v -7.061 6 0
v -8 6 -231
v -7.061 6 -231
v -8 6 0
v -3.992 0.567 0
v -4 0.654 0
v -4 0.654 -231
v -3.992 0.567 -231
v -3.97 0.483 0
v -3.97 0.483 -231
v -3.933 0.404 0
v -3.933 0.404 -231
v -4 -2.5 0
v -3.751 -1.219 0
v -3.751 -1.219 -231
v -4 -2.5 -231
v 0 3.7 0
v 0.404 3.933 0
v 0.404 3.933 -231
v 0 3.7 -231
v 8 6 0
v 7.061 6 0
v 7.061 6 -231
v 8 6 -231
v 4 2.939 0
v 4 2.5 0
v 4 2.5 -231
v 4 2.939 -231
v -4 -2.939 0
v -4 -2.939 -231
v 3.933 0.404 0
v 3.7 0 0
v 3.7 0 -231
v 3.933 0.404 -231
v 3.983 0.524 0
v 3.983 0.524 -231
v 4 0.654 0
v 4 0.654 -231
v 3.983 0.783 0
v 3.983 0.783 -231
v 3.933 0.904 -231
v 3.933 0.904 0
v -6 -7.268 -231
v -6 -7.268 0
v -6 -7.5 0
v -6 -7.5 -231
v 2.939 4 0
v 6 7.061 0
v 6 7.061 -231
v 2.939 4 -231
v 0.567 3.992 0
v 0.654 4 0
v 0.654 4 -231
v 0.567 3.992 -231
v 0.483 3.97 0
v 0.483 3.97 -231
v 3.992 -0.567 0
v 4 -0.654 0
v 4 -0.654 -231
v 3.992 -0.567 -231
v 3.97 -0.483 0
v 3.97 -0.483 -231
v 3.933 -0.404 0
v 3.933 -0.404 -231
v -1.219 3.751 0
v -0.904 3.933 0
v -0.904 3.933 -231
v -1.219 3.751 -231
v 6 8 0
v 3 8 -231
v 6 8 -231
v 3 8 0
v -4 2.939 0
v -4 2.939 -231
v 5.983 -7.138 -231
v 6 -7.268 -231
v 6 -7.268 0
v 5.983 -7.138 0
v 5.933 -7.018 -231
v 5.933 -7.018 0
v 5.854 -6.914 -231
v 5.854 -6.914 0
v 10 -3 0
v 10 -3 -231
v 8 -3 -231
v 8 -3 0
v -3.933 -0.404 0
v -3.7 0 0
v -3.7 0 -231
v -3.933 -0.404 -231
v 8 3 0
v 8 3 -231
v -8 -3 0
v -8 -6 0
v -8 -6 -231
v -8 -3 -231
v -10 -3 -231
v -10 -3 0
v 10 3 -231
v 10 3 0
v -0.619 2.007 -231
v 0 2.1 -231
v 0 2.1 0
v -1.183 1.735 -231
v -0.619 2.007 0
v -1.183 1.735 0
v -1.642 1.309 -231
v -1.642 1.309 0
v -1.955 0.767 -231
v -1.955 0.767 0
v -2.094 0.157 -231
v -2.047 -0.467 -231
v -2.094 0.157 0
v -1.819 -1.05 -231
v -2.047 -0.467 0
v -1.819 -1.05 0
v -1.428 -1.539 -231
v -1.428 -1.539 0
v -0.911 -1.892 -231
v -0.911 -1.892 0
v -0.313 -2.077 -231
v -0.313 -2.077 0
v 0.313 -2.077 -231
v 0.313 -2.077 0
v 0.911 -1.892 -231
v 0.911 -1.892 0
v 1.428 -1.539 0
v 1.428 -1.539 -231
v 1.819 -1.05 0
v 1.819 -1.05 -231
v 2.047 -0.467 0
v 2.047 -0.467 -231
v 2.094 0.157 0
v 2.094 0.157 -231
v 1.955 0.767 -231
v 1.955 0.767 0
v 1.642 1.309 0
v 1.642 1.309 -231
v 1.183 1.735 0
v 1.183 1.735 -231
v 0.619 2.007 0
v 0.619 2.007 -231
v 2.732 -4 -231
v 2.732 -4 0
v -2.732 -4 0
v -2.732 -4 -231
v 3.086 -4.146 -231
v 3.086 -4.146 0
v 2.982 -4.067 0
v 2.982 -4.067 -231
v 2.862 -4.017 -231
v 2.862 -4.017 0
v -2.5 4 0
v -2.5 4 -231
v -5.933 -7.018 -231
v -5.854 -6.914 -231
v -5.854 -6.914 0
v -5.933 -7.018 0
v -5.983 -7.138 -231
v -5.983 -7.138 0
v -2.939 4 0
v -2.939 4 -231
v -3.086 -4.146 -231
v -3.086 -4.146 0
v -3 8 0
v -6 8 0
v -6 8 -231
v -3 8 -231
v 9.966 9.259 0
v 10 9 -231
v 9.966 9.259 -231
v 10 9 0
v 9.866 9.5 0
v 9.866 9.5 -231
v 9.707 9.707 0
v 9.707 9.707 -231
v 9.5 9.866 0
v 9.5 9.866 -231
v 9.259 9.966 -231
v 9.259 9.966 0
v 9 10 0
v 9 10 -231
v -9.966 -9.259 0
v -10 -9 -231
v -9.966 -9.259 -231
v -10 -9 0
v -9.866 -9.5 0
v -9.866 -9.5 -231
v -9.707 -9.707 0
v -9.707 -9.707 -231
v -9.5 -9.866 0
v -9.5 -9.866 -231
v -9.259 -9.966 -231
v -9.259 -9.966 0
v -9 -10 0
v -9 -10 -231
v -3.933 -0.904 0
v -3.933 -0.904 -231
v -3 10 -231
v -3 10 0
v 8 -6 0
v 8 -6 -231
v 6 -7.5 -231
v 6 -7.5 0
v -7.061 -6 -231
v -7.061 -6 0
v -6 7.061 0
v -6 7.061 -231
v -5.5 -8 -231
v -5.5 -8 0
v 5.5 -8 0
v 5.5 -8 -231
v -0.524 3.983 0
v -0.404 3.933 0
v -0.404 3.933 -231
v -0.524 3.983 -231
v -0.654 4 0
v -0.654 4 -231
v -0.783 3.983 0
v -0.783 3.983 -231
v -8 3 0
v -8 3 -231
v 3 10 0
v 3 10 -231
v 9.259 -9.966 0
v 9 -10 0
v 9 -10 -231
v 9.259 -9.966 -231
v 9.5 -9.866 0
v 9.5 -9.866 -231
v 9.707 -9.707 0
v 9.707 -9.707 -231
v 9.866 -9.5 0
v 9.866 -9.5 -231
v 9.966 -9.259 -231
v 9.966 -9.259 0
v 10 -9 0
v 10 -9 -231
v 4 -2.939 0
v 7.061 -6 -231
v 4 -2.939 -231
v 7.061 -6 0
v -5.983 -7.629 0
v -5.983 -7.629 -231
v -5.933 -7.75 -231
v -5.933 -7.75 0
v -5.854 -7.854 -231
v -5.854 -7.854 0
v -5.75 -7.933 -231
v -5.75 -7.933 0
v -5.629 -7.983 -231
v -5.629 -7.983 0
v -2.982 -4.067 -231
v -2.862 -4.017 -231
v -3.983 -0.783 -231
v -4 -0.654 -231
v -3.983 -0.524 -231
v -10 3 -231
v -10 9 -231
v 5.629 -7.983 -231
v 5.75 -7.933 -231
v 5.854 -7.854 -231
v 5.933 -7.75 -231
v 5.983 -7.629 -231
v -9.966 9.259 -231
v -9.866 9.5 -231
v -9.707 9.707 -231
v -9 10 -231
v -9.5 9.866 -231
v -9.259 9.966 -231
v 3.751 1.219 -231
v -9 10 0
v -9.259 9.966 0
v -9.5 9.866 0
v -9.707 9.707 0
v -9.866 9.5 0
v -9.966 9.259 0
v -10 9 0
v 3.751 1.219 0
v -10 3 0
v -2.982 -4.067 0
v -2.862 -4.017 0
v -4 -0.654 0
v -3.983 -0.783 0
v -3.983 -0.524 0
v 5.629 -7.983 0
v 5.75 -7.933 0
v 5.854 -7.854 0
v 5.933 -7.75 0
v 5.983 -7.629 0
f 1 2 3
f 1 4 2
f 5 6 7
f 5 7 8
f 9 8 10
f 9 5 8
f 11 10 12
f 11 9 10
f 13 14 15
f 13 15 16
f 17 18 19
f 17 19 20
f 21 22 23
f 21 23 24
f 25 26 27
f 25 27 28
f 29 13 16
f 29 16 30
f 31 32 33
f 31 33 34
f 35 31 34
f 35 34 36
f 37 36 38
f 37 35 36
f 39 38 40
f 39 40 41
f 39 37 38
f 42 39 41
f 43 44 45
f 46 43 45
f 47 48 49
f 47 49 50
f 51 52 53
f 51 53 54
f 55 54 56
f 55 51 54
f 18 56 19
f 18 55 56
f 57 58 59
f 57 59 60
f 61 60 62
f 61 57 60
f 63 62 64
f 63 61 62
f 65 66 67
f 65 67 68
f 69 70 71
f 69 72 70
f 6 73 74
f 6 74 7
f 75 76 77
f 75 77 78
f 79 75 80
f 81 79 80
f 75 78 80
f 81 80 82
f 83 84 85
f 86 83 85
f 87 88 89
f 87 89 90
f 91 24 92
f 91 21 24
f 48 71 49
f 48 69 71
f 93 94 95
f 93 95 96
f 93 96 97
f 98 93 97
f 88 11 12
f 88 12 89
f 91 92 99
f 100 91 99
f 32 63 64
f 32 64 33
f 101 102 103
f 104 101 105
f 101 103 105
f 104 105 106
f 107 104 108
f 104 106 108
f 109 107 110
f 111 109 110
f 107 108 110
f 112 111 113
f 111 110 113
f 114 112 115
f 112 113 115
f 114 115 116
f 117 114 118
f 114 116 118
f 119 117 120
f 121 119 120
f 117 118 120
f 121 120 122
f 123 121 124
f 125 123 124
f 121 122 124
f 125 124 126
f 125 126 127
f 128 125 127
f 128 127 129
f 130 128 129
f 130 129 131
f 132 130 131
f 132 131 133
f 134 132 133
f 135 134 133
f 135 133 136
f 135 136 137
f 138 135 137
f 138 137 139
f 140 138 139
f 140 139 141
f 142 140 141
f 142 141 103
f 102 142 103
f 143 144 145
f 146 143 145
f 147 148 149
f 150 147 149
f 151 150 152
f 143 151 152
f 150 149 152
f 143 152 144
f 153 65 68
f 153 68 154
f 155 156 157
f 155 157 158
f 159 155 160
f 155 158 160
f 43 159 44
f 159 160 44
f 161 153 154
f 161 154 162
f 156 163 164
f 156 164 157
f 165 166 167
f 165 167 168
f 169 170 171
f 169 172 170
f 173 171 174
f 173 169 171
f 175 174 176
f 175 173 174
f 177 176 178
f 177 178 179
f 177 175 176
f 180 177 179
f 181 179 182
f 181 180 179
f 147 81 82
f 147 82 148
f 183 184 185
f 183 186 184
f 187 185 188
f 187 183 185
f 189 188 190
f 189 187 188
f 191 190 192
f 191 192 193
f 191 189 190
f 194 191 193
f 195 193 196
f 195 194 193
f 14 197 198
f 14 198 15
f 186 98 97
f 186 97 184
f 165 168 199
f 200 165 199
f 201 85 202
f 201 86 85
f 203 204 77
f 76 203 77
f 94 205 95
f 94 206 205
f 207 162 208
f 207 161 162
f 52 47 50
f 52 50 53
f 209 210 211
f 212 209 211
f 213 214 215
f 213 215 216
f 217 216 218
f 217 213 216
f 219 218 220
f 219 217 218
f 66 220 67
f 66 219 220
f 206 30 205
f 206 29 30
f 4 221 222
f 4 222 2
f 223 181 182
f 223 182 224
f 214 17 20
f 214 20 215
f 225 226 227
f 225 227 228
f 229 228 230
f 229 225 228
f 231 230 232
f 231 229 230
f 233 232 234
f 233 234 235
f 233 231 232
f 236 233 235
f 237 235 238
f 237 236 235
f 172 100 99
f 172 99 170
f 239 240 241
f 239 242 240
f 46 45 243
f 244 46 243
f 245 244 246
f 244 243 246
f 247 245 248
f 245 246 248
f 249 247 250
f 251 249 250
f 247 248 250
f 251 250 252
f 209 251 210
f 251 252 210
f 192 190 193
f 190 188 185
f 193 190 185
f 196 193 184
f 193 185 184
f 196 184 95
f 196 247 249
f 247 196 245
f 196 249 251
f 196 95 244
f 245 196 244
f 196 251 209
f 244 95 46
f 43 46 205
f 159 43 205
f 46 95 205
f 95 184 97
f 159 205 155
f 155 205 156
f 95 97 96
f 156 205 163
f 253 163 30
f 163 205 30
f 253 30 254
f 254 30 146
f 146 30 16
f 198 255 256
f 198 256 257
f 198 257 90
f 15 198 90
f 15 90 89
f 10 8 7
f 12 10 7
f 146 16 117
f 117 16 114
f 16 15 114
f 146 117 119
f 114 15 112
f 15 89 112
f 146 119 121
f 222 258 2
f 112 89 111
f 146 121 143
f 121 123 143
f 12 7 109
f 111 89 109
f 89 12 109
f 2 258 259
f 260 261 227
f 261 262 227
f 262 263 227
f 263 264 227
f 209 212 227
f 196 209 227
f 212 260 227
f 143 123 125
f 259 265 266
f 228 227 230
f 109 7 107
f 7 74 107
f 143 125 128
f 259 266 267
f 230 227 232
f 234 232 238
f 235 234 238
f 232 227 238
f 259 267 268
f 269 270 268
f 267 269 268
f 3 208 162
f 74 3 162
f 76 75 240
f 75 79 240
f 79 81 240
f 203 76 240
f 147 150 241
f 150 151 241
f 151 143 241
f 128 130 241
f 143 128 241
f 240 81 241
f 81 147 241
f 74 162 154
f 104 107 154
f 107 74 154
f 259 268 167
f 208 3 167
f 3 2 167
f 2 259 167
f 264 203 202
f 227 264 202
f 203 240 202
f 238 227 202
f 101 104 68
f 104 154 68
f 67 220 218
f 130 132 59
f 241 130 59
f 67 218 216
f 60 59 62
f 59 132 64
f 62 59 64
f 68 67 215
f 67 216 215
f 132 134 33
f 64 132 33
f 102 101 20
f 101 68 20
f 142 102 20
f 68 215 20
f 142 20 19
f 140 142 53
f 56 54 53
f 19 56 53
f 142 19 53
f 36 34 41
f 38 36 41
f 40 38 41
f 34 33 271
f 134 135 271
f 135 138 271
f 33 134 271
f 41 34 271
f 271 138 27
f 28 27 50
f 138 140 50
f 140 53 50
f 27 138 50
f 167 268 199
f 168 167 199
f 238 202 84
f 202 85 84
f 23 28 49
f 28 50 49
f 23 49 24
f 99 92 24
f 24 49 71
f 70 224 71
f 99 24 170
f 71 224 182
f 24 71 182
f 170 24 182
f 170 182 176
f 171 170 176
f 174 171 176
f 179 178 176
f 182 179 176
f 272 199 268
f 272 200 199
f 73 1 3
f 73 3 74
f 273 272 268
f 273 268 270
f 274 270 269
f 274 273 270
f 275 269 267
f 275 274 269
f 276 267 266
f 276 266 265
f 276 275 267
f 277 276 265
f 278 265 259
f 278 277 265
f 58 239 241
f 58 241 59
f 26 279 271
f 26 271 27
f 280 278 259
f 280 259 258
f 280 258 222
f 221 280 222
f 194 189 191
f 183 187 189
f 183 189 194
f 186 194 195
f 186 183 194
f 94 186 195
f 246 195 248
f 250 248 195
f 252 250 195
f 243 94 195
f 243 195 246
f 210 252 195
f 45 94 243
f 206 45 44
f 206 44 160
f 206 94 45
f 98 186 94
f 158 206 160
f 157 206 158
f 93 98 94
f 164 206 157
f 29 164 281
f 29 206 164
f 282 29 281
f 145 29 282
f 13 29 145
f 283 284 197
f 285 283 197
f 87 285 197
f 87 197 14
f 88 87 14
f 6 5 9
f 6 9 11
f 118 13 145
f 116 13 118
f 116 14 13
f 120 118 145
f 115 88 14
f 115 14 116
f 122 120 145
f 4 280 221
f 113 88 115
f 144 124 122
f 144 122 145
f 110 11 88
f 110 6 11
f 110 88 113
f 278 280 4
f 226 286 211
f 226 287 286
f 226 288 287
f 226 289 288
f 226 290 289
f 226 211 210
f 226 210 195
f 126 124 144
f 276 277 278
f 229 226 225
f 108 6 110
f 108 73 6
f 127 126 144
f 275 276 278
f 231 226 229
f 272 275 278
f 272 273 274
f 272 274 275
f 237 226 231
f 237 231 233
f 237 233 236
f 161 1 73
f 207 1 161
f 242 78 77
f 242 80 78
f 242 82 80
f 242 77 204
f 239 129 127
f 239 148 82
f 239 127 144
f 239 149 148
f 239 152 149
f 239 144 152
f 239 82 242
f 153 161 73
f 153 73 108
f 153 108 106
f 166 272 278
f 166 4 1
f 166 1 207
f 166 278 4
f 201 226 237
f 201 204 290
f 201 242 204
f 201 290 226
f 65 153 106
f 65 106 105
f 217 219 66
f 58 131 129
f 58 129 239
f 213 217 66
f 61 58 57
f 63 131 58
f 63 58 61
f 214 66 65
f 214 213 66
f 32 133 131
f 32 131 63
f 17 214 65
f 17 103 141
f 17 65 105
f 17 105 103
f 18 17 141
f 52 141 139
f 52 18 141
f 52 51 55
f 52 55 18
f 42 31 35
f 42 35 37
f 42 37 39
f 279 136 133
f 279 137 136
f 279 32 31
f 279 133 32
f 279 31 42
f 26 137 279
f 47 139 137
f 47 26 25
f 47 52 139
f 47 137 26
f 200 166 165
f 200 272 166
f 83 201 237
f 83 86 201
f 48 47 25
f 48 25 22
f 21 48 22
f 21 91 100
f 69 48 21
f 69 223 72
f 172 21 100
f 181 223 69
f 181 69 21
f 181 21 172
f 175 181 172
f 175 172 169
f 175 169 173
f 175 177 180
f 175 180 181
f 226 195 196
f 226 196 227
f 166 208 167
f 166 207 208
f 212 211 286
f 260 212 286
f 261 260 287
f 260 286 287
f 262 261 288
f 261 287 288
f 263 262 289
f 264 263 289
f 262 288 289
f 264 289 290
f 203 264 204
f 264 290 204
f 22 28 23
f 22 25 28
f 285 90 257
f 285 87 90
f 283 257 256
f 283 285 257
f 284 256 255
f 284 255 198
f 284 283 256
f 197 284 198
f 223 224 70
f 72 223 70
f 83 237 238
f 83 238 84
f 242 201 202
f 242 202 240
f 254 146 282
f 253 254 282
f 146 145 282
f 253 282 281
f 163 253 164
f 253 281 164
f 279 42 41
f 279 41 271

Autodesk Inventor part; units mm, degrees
sketch "Sketch_76" plane through (0, 0, 0) normal (0, 0, 1) x (1, 0, 0)
  line L0 (-10, -3) -> (-10, -9)
  arc A0 (-10, -9) -> (-9, -10) centre (-9, -9) ccw
  line L1 (-9, -10) -> (9, -10)
  arc A1 (9, -10) -> (10, -9) centre (9, -9) ccw
  line L2 (10, -9) -> (10, -3)
  line L3 (10, -3) -> (8, -3)
  line L4 (8, -3) -> (8, -6)
  line L5 (8, -6) -> (7.0607, -6)
  line L6 (7.0607, -6) -> (4, -2.9393)
  line L7 (4, -2.9393) -> (4, -0.6536)
  arc A2 (4, -0.6536) -> (3.933, -0.4036) centre (3.5, -0.6536) ccw
  line L8 (3.933, -0.4036) -> (3.7, 0)
  line L9 (3.7, 0) -> (3.933, 0.4036)
  arc A3 (3.933, 0.4036) -> (3.933, 0.9036) centre (3.5, 0.6536) ccw
  line L10 (3.933, 0.9036) -> (3.751, 1.2189)
  line L11 (3.751, 1.2189) -> (4, 2.5)
  line L12 (4, 2.5) -> (4, 2.9393)
  line L13 (4, 2.9393) -> (7.0607, 6)
  line L14 (7.0607, 6) -> (8, 6)
  line L15 (8, 6) -> (8, 3)
  line L16 (8, 3) -> (10, 3)
  line L17 (10, 3) -> (10, 9)
  arc A4 (10, 9) -> (9, 10) centre (9, 9) ccw
  line L18 (9, 10) -> (3, 10)
  line L19 (3, 10) -> (3, 8)
  line L20 (3, 8) -> (6, 8)
  line L21 (6, 8) -> (6, 7.0607)
  line L22 (6, 7.0607) -> (2.9393, 4)
  line L23 (2.9393, 4) -> (0.6536, 4)
  arc A5 (0.6536, 4) -> (0.4036, 3.933) centre (0.6536, 3.5) ccw
  line L24 (0.4036, 3.933) -> (0, 3.7)
  line L25 (0, 3.7) -> (-0.4036, 3.933)
  arc A6 (-0.4036, 3.933) -> (-0.9036, 3.933) centre (-0.6536, 3.5) ccw
  line L26 (-0.9036, 3.933) -> (-1.2189, 3.751)
  line L27 (-1.2189, 3.751) -> (-2.5, 4)
  line L28 (-2.5, 4) -> (-2.9393, 4)
  line L29 (-2.9393, 4) -> (-6, 7.0607)
  line L30 (-6, 7.0607) -> (-6, 8)
  line L31 (-6, 8) -> (-3, 8)
  line L32 (-3, 8) -> (-3, 10)
  line L33 (-3, 10) -> (-9, 10)
  arc A7 (-9, 10) -> (-10, 9) centre (-9, 9) ccw
  line L34 (-10, 9) -> (-10, 3)
  line L35 (-10, 3) -> (-8, 3)
  line L36 (-8, 3) -> (-8, 6)
  line L37 (-8, 6) -> (-7.0607, 6)
  line L38 (-7.0607, 6) -> (-4, 2.9393)
  line L39 (-4, 2.9393) -> (-4, 0.6536)
  arc A8 (-4, 0.6536) -> (-3.933, 0.4036) centre (-3.5, 0.6536) ccw
  line L40 (-3.933, 0.4036) -> (-3.7, 0)
  line L41 (-3.7, 0) -> (-3.933, -0.4036)
  arc A9 (-3.933, -0.4036) -> (-3.933, -0.9036) centre (-3.5, -0.6536) ccw
  line L42 (-3.933, -0.9036) -> (-3.751, -1.2189)
  line L43 (-3.751, -1.2189) -> (-4, -2.5)
  line L44 (-4, -2.5) -> (-4, -2.9393)
  line L45 (-4, -2.9393) -> (-7.0607, -6)
  line L46 (-7.0607, -6) -> (-8, -6)
  line L47 (-8, -6) -> (-8, -3)
  line L48 (-8, -3) -> (-10, -3)
  line L49 (-6, -7.2678) -> (-6, -7.5)
  arc A10 (-6, -7.5) -> (-5.5, -8) centre (-5.5, -7.5) ccw
  line L50 (-5.5, -8) -> (5.5, -8)
  arc A11 (5.5, -8) -> (6, -7.5) centre (5.5, -7.5) ccw
  line L51 (6, -7.5) -> (6, -7.2678)
  arc A12 (6, -7.2678) -> (5.8536, -6.9142) centre (5.5, -7.2678) ccw
  line L52 (5.8536, -6.9142) -> (3.0858, -4.1464)
  arc A13 (3.0858, -4.1464) -> (2.7322, -4) centre (2.7322, -4.5) ccw
  line L53 (2.7322, -4) -> (-2.7322, -4)
  arc A14 (-2.7322, -4) -> (-3.0858, -4.1464) centre (-2.7322, -4.5) ccw
  line L54 (-3.0858, -4.1464) -> (-5.8536, -6.9142)
  arc A15 (-5.8536, -6.9142) -> (-6, -7.2678) centre (-5.5, -7.2678) ccw
extrude "Extrusion1" add sketch "Sketch_76" against normal blind 231
sketch "Sketch2" plane through (0, 0, -231) normal (0, 0, -1) x (-1, 0, 0)
  point P0 (0, 0)
hole "Hole1" at (0, 0, -231) direction (0, 0, 1) diameter 4.2 depth 231
ref_plane "C1_XY" through (0, 0, 0) normal (0, 0, 1) x (1, 0, 0)
ref_plane "C1_YZ" through (0, 0, 0) normal (1, 0, 0) x (0, 1, 0)
ref_plane "C1_ZX" through (0, 0, 0) normal (0, 1, 0) x (0, 0, 1)
properties part number "NFSF5-2020-231"
